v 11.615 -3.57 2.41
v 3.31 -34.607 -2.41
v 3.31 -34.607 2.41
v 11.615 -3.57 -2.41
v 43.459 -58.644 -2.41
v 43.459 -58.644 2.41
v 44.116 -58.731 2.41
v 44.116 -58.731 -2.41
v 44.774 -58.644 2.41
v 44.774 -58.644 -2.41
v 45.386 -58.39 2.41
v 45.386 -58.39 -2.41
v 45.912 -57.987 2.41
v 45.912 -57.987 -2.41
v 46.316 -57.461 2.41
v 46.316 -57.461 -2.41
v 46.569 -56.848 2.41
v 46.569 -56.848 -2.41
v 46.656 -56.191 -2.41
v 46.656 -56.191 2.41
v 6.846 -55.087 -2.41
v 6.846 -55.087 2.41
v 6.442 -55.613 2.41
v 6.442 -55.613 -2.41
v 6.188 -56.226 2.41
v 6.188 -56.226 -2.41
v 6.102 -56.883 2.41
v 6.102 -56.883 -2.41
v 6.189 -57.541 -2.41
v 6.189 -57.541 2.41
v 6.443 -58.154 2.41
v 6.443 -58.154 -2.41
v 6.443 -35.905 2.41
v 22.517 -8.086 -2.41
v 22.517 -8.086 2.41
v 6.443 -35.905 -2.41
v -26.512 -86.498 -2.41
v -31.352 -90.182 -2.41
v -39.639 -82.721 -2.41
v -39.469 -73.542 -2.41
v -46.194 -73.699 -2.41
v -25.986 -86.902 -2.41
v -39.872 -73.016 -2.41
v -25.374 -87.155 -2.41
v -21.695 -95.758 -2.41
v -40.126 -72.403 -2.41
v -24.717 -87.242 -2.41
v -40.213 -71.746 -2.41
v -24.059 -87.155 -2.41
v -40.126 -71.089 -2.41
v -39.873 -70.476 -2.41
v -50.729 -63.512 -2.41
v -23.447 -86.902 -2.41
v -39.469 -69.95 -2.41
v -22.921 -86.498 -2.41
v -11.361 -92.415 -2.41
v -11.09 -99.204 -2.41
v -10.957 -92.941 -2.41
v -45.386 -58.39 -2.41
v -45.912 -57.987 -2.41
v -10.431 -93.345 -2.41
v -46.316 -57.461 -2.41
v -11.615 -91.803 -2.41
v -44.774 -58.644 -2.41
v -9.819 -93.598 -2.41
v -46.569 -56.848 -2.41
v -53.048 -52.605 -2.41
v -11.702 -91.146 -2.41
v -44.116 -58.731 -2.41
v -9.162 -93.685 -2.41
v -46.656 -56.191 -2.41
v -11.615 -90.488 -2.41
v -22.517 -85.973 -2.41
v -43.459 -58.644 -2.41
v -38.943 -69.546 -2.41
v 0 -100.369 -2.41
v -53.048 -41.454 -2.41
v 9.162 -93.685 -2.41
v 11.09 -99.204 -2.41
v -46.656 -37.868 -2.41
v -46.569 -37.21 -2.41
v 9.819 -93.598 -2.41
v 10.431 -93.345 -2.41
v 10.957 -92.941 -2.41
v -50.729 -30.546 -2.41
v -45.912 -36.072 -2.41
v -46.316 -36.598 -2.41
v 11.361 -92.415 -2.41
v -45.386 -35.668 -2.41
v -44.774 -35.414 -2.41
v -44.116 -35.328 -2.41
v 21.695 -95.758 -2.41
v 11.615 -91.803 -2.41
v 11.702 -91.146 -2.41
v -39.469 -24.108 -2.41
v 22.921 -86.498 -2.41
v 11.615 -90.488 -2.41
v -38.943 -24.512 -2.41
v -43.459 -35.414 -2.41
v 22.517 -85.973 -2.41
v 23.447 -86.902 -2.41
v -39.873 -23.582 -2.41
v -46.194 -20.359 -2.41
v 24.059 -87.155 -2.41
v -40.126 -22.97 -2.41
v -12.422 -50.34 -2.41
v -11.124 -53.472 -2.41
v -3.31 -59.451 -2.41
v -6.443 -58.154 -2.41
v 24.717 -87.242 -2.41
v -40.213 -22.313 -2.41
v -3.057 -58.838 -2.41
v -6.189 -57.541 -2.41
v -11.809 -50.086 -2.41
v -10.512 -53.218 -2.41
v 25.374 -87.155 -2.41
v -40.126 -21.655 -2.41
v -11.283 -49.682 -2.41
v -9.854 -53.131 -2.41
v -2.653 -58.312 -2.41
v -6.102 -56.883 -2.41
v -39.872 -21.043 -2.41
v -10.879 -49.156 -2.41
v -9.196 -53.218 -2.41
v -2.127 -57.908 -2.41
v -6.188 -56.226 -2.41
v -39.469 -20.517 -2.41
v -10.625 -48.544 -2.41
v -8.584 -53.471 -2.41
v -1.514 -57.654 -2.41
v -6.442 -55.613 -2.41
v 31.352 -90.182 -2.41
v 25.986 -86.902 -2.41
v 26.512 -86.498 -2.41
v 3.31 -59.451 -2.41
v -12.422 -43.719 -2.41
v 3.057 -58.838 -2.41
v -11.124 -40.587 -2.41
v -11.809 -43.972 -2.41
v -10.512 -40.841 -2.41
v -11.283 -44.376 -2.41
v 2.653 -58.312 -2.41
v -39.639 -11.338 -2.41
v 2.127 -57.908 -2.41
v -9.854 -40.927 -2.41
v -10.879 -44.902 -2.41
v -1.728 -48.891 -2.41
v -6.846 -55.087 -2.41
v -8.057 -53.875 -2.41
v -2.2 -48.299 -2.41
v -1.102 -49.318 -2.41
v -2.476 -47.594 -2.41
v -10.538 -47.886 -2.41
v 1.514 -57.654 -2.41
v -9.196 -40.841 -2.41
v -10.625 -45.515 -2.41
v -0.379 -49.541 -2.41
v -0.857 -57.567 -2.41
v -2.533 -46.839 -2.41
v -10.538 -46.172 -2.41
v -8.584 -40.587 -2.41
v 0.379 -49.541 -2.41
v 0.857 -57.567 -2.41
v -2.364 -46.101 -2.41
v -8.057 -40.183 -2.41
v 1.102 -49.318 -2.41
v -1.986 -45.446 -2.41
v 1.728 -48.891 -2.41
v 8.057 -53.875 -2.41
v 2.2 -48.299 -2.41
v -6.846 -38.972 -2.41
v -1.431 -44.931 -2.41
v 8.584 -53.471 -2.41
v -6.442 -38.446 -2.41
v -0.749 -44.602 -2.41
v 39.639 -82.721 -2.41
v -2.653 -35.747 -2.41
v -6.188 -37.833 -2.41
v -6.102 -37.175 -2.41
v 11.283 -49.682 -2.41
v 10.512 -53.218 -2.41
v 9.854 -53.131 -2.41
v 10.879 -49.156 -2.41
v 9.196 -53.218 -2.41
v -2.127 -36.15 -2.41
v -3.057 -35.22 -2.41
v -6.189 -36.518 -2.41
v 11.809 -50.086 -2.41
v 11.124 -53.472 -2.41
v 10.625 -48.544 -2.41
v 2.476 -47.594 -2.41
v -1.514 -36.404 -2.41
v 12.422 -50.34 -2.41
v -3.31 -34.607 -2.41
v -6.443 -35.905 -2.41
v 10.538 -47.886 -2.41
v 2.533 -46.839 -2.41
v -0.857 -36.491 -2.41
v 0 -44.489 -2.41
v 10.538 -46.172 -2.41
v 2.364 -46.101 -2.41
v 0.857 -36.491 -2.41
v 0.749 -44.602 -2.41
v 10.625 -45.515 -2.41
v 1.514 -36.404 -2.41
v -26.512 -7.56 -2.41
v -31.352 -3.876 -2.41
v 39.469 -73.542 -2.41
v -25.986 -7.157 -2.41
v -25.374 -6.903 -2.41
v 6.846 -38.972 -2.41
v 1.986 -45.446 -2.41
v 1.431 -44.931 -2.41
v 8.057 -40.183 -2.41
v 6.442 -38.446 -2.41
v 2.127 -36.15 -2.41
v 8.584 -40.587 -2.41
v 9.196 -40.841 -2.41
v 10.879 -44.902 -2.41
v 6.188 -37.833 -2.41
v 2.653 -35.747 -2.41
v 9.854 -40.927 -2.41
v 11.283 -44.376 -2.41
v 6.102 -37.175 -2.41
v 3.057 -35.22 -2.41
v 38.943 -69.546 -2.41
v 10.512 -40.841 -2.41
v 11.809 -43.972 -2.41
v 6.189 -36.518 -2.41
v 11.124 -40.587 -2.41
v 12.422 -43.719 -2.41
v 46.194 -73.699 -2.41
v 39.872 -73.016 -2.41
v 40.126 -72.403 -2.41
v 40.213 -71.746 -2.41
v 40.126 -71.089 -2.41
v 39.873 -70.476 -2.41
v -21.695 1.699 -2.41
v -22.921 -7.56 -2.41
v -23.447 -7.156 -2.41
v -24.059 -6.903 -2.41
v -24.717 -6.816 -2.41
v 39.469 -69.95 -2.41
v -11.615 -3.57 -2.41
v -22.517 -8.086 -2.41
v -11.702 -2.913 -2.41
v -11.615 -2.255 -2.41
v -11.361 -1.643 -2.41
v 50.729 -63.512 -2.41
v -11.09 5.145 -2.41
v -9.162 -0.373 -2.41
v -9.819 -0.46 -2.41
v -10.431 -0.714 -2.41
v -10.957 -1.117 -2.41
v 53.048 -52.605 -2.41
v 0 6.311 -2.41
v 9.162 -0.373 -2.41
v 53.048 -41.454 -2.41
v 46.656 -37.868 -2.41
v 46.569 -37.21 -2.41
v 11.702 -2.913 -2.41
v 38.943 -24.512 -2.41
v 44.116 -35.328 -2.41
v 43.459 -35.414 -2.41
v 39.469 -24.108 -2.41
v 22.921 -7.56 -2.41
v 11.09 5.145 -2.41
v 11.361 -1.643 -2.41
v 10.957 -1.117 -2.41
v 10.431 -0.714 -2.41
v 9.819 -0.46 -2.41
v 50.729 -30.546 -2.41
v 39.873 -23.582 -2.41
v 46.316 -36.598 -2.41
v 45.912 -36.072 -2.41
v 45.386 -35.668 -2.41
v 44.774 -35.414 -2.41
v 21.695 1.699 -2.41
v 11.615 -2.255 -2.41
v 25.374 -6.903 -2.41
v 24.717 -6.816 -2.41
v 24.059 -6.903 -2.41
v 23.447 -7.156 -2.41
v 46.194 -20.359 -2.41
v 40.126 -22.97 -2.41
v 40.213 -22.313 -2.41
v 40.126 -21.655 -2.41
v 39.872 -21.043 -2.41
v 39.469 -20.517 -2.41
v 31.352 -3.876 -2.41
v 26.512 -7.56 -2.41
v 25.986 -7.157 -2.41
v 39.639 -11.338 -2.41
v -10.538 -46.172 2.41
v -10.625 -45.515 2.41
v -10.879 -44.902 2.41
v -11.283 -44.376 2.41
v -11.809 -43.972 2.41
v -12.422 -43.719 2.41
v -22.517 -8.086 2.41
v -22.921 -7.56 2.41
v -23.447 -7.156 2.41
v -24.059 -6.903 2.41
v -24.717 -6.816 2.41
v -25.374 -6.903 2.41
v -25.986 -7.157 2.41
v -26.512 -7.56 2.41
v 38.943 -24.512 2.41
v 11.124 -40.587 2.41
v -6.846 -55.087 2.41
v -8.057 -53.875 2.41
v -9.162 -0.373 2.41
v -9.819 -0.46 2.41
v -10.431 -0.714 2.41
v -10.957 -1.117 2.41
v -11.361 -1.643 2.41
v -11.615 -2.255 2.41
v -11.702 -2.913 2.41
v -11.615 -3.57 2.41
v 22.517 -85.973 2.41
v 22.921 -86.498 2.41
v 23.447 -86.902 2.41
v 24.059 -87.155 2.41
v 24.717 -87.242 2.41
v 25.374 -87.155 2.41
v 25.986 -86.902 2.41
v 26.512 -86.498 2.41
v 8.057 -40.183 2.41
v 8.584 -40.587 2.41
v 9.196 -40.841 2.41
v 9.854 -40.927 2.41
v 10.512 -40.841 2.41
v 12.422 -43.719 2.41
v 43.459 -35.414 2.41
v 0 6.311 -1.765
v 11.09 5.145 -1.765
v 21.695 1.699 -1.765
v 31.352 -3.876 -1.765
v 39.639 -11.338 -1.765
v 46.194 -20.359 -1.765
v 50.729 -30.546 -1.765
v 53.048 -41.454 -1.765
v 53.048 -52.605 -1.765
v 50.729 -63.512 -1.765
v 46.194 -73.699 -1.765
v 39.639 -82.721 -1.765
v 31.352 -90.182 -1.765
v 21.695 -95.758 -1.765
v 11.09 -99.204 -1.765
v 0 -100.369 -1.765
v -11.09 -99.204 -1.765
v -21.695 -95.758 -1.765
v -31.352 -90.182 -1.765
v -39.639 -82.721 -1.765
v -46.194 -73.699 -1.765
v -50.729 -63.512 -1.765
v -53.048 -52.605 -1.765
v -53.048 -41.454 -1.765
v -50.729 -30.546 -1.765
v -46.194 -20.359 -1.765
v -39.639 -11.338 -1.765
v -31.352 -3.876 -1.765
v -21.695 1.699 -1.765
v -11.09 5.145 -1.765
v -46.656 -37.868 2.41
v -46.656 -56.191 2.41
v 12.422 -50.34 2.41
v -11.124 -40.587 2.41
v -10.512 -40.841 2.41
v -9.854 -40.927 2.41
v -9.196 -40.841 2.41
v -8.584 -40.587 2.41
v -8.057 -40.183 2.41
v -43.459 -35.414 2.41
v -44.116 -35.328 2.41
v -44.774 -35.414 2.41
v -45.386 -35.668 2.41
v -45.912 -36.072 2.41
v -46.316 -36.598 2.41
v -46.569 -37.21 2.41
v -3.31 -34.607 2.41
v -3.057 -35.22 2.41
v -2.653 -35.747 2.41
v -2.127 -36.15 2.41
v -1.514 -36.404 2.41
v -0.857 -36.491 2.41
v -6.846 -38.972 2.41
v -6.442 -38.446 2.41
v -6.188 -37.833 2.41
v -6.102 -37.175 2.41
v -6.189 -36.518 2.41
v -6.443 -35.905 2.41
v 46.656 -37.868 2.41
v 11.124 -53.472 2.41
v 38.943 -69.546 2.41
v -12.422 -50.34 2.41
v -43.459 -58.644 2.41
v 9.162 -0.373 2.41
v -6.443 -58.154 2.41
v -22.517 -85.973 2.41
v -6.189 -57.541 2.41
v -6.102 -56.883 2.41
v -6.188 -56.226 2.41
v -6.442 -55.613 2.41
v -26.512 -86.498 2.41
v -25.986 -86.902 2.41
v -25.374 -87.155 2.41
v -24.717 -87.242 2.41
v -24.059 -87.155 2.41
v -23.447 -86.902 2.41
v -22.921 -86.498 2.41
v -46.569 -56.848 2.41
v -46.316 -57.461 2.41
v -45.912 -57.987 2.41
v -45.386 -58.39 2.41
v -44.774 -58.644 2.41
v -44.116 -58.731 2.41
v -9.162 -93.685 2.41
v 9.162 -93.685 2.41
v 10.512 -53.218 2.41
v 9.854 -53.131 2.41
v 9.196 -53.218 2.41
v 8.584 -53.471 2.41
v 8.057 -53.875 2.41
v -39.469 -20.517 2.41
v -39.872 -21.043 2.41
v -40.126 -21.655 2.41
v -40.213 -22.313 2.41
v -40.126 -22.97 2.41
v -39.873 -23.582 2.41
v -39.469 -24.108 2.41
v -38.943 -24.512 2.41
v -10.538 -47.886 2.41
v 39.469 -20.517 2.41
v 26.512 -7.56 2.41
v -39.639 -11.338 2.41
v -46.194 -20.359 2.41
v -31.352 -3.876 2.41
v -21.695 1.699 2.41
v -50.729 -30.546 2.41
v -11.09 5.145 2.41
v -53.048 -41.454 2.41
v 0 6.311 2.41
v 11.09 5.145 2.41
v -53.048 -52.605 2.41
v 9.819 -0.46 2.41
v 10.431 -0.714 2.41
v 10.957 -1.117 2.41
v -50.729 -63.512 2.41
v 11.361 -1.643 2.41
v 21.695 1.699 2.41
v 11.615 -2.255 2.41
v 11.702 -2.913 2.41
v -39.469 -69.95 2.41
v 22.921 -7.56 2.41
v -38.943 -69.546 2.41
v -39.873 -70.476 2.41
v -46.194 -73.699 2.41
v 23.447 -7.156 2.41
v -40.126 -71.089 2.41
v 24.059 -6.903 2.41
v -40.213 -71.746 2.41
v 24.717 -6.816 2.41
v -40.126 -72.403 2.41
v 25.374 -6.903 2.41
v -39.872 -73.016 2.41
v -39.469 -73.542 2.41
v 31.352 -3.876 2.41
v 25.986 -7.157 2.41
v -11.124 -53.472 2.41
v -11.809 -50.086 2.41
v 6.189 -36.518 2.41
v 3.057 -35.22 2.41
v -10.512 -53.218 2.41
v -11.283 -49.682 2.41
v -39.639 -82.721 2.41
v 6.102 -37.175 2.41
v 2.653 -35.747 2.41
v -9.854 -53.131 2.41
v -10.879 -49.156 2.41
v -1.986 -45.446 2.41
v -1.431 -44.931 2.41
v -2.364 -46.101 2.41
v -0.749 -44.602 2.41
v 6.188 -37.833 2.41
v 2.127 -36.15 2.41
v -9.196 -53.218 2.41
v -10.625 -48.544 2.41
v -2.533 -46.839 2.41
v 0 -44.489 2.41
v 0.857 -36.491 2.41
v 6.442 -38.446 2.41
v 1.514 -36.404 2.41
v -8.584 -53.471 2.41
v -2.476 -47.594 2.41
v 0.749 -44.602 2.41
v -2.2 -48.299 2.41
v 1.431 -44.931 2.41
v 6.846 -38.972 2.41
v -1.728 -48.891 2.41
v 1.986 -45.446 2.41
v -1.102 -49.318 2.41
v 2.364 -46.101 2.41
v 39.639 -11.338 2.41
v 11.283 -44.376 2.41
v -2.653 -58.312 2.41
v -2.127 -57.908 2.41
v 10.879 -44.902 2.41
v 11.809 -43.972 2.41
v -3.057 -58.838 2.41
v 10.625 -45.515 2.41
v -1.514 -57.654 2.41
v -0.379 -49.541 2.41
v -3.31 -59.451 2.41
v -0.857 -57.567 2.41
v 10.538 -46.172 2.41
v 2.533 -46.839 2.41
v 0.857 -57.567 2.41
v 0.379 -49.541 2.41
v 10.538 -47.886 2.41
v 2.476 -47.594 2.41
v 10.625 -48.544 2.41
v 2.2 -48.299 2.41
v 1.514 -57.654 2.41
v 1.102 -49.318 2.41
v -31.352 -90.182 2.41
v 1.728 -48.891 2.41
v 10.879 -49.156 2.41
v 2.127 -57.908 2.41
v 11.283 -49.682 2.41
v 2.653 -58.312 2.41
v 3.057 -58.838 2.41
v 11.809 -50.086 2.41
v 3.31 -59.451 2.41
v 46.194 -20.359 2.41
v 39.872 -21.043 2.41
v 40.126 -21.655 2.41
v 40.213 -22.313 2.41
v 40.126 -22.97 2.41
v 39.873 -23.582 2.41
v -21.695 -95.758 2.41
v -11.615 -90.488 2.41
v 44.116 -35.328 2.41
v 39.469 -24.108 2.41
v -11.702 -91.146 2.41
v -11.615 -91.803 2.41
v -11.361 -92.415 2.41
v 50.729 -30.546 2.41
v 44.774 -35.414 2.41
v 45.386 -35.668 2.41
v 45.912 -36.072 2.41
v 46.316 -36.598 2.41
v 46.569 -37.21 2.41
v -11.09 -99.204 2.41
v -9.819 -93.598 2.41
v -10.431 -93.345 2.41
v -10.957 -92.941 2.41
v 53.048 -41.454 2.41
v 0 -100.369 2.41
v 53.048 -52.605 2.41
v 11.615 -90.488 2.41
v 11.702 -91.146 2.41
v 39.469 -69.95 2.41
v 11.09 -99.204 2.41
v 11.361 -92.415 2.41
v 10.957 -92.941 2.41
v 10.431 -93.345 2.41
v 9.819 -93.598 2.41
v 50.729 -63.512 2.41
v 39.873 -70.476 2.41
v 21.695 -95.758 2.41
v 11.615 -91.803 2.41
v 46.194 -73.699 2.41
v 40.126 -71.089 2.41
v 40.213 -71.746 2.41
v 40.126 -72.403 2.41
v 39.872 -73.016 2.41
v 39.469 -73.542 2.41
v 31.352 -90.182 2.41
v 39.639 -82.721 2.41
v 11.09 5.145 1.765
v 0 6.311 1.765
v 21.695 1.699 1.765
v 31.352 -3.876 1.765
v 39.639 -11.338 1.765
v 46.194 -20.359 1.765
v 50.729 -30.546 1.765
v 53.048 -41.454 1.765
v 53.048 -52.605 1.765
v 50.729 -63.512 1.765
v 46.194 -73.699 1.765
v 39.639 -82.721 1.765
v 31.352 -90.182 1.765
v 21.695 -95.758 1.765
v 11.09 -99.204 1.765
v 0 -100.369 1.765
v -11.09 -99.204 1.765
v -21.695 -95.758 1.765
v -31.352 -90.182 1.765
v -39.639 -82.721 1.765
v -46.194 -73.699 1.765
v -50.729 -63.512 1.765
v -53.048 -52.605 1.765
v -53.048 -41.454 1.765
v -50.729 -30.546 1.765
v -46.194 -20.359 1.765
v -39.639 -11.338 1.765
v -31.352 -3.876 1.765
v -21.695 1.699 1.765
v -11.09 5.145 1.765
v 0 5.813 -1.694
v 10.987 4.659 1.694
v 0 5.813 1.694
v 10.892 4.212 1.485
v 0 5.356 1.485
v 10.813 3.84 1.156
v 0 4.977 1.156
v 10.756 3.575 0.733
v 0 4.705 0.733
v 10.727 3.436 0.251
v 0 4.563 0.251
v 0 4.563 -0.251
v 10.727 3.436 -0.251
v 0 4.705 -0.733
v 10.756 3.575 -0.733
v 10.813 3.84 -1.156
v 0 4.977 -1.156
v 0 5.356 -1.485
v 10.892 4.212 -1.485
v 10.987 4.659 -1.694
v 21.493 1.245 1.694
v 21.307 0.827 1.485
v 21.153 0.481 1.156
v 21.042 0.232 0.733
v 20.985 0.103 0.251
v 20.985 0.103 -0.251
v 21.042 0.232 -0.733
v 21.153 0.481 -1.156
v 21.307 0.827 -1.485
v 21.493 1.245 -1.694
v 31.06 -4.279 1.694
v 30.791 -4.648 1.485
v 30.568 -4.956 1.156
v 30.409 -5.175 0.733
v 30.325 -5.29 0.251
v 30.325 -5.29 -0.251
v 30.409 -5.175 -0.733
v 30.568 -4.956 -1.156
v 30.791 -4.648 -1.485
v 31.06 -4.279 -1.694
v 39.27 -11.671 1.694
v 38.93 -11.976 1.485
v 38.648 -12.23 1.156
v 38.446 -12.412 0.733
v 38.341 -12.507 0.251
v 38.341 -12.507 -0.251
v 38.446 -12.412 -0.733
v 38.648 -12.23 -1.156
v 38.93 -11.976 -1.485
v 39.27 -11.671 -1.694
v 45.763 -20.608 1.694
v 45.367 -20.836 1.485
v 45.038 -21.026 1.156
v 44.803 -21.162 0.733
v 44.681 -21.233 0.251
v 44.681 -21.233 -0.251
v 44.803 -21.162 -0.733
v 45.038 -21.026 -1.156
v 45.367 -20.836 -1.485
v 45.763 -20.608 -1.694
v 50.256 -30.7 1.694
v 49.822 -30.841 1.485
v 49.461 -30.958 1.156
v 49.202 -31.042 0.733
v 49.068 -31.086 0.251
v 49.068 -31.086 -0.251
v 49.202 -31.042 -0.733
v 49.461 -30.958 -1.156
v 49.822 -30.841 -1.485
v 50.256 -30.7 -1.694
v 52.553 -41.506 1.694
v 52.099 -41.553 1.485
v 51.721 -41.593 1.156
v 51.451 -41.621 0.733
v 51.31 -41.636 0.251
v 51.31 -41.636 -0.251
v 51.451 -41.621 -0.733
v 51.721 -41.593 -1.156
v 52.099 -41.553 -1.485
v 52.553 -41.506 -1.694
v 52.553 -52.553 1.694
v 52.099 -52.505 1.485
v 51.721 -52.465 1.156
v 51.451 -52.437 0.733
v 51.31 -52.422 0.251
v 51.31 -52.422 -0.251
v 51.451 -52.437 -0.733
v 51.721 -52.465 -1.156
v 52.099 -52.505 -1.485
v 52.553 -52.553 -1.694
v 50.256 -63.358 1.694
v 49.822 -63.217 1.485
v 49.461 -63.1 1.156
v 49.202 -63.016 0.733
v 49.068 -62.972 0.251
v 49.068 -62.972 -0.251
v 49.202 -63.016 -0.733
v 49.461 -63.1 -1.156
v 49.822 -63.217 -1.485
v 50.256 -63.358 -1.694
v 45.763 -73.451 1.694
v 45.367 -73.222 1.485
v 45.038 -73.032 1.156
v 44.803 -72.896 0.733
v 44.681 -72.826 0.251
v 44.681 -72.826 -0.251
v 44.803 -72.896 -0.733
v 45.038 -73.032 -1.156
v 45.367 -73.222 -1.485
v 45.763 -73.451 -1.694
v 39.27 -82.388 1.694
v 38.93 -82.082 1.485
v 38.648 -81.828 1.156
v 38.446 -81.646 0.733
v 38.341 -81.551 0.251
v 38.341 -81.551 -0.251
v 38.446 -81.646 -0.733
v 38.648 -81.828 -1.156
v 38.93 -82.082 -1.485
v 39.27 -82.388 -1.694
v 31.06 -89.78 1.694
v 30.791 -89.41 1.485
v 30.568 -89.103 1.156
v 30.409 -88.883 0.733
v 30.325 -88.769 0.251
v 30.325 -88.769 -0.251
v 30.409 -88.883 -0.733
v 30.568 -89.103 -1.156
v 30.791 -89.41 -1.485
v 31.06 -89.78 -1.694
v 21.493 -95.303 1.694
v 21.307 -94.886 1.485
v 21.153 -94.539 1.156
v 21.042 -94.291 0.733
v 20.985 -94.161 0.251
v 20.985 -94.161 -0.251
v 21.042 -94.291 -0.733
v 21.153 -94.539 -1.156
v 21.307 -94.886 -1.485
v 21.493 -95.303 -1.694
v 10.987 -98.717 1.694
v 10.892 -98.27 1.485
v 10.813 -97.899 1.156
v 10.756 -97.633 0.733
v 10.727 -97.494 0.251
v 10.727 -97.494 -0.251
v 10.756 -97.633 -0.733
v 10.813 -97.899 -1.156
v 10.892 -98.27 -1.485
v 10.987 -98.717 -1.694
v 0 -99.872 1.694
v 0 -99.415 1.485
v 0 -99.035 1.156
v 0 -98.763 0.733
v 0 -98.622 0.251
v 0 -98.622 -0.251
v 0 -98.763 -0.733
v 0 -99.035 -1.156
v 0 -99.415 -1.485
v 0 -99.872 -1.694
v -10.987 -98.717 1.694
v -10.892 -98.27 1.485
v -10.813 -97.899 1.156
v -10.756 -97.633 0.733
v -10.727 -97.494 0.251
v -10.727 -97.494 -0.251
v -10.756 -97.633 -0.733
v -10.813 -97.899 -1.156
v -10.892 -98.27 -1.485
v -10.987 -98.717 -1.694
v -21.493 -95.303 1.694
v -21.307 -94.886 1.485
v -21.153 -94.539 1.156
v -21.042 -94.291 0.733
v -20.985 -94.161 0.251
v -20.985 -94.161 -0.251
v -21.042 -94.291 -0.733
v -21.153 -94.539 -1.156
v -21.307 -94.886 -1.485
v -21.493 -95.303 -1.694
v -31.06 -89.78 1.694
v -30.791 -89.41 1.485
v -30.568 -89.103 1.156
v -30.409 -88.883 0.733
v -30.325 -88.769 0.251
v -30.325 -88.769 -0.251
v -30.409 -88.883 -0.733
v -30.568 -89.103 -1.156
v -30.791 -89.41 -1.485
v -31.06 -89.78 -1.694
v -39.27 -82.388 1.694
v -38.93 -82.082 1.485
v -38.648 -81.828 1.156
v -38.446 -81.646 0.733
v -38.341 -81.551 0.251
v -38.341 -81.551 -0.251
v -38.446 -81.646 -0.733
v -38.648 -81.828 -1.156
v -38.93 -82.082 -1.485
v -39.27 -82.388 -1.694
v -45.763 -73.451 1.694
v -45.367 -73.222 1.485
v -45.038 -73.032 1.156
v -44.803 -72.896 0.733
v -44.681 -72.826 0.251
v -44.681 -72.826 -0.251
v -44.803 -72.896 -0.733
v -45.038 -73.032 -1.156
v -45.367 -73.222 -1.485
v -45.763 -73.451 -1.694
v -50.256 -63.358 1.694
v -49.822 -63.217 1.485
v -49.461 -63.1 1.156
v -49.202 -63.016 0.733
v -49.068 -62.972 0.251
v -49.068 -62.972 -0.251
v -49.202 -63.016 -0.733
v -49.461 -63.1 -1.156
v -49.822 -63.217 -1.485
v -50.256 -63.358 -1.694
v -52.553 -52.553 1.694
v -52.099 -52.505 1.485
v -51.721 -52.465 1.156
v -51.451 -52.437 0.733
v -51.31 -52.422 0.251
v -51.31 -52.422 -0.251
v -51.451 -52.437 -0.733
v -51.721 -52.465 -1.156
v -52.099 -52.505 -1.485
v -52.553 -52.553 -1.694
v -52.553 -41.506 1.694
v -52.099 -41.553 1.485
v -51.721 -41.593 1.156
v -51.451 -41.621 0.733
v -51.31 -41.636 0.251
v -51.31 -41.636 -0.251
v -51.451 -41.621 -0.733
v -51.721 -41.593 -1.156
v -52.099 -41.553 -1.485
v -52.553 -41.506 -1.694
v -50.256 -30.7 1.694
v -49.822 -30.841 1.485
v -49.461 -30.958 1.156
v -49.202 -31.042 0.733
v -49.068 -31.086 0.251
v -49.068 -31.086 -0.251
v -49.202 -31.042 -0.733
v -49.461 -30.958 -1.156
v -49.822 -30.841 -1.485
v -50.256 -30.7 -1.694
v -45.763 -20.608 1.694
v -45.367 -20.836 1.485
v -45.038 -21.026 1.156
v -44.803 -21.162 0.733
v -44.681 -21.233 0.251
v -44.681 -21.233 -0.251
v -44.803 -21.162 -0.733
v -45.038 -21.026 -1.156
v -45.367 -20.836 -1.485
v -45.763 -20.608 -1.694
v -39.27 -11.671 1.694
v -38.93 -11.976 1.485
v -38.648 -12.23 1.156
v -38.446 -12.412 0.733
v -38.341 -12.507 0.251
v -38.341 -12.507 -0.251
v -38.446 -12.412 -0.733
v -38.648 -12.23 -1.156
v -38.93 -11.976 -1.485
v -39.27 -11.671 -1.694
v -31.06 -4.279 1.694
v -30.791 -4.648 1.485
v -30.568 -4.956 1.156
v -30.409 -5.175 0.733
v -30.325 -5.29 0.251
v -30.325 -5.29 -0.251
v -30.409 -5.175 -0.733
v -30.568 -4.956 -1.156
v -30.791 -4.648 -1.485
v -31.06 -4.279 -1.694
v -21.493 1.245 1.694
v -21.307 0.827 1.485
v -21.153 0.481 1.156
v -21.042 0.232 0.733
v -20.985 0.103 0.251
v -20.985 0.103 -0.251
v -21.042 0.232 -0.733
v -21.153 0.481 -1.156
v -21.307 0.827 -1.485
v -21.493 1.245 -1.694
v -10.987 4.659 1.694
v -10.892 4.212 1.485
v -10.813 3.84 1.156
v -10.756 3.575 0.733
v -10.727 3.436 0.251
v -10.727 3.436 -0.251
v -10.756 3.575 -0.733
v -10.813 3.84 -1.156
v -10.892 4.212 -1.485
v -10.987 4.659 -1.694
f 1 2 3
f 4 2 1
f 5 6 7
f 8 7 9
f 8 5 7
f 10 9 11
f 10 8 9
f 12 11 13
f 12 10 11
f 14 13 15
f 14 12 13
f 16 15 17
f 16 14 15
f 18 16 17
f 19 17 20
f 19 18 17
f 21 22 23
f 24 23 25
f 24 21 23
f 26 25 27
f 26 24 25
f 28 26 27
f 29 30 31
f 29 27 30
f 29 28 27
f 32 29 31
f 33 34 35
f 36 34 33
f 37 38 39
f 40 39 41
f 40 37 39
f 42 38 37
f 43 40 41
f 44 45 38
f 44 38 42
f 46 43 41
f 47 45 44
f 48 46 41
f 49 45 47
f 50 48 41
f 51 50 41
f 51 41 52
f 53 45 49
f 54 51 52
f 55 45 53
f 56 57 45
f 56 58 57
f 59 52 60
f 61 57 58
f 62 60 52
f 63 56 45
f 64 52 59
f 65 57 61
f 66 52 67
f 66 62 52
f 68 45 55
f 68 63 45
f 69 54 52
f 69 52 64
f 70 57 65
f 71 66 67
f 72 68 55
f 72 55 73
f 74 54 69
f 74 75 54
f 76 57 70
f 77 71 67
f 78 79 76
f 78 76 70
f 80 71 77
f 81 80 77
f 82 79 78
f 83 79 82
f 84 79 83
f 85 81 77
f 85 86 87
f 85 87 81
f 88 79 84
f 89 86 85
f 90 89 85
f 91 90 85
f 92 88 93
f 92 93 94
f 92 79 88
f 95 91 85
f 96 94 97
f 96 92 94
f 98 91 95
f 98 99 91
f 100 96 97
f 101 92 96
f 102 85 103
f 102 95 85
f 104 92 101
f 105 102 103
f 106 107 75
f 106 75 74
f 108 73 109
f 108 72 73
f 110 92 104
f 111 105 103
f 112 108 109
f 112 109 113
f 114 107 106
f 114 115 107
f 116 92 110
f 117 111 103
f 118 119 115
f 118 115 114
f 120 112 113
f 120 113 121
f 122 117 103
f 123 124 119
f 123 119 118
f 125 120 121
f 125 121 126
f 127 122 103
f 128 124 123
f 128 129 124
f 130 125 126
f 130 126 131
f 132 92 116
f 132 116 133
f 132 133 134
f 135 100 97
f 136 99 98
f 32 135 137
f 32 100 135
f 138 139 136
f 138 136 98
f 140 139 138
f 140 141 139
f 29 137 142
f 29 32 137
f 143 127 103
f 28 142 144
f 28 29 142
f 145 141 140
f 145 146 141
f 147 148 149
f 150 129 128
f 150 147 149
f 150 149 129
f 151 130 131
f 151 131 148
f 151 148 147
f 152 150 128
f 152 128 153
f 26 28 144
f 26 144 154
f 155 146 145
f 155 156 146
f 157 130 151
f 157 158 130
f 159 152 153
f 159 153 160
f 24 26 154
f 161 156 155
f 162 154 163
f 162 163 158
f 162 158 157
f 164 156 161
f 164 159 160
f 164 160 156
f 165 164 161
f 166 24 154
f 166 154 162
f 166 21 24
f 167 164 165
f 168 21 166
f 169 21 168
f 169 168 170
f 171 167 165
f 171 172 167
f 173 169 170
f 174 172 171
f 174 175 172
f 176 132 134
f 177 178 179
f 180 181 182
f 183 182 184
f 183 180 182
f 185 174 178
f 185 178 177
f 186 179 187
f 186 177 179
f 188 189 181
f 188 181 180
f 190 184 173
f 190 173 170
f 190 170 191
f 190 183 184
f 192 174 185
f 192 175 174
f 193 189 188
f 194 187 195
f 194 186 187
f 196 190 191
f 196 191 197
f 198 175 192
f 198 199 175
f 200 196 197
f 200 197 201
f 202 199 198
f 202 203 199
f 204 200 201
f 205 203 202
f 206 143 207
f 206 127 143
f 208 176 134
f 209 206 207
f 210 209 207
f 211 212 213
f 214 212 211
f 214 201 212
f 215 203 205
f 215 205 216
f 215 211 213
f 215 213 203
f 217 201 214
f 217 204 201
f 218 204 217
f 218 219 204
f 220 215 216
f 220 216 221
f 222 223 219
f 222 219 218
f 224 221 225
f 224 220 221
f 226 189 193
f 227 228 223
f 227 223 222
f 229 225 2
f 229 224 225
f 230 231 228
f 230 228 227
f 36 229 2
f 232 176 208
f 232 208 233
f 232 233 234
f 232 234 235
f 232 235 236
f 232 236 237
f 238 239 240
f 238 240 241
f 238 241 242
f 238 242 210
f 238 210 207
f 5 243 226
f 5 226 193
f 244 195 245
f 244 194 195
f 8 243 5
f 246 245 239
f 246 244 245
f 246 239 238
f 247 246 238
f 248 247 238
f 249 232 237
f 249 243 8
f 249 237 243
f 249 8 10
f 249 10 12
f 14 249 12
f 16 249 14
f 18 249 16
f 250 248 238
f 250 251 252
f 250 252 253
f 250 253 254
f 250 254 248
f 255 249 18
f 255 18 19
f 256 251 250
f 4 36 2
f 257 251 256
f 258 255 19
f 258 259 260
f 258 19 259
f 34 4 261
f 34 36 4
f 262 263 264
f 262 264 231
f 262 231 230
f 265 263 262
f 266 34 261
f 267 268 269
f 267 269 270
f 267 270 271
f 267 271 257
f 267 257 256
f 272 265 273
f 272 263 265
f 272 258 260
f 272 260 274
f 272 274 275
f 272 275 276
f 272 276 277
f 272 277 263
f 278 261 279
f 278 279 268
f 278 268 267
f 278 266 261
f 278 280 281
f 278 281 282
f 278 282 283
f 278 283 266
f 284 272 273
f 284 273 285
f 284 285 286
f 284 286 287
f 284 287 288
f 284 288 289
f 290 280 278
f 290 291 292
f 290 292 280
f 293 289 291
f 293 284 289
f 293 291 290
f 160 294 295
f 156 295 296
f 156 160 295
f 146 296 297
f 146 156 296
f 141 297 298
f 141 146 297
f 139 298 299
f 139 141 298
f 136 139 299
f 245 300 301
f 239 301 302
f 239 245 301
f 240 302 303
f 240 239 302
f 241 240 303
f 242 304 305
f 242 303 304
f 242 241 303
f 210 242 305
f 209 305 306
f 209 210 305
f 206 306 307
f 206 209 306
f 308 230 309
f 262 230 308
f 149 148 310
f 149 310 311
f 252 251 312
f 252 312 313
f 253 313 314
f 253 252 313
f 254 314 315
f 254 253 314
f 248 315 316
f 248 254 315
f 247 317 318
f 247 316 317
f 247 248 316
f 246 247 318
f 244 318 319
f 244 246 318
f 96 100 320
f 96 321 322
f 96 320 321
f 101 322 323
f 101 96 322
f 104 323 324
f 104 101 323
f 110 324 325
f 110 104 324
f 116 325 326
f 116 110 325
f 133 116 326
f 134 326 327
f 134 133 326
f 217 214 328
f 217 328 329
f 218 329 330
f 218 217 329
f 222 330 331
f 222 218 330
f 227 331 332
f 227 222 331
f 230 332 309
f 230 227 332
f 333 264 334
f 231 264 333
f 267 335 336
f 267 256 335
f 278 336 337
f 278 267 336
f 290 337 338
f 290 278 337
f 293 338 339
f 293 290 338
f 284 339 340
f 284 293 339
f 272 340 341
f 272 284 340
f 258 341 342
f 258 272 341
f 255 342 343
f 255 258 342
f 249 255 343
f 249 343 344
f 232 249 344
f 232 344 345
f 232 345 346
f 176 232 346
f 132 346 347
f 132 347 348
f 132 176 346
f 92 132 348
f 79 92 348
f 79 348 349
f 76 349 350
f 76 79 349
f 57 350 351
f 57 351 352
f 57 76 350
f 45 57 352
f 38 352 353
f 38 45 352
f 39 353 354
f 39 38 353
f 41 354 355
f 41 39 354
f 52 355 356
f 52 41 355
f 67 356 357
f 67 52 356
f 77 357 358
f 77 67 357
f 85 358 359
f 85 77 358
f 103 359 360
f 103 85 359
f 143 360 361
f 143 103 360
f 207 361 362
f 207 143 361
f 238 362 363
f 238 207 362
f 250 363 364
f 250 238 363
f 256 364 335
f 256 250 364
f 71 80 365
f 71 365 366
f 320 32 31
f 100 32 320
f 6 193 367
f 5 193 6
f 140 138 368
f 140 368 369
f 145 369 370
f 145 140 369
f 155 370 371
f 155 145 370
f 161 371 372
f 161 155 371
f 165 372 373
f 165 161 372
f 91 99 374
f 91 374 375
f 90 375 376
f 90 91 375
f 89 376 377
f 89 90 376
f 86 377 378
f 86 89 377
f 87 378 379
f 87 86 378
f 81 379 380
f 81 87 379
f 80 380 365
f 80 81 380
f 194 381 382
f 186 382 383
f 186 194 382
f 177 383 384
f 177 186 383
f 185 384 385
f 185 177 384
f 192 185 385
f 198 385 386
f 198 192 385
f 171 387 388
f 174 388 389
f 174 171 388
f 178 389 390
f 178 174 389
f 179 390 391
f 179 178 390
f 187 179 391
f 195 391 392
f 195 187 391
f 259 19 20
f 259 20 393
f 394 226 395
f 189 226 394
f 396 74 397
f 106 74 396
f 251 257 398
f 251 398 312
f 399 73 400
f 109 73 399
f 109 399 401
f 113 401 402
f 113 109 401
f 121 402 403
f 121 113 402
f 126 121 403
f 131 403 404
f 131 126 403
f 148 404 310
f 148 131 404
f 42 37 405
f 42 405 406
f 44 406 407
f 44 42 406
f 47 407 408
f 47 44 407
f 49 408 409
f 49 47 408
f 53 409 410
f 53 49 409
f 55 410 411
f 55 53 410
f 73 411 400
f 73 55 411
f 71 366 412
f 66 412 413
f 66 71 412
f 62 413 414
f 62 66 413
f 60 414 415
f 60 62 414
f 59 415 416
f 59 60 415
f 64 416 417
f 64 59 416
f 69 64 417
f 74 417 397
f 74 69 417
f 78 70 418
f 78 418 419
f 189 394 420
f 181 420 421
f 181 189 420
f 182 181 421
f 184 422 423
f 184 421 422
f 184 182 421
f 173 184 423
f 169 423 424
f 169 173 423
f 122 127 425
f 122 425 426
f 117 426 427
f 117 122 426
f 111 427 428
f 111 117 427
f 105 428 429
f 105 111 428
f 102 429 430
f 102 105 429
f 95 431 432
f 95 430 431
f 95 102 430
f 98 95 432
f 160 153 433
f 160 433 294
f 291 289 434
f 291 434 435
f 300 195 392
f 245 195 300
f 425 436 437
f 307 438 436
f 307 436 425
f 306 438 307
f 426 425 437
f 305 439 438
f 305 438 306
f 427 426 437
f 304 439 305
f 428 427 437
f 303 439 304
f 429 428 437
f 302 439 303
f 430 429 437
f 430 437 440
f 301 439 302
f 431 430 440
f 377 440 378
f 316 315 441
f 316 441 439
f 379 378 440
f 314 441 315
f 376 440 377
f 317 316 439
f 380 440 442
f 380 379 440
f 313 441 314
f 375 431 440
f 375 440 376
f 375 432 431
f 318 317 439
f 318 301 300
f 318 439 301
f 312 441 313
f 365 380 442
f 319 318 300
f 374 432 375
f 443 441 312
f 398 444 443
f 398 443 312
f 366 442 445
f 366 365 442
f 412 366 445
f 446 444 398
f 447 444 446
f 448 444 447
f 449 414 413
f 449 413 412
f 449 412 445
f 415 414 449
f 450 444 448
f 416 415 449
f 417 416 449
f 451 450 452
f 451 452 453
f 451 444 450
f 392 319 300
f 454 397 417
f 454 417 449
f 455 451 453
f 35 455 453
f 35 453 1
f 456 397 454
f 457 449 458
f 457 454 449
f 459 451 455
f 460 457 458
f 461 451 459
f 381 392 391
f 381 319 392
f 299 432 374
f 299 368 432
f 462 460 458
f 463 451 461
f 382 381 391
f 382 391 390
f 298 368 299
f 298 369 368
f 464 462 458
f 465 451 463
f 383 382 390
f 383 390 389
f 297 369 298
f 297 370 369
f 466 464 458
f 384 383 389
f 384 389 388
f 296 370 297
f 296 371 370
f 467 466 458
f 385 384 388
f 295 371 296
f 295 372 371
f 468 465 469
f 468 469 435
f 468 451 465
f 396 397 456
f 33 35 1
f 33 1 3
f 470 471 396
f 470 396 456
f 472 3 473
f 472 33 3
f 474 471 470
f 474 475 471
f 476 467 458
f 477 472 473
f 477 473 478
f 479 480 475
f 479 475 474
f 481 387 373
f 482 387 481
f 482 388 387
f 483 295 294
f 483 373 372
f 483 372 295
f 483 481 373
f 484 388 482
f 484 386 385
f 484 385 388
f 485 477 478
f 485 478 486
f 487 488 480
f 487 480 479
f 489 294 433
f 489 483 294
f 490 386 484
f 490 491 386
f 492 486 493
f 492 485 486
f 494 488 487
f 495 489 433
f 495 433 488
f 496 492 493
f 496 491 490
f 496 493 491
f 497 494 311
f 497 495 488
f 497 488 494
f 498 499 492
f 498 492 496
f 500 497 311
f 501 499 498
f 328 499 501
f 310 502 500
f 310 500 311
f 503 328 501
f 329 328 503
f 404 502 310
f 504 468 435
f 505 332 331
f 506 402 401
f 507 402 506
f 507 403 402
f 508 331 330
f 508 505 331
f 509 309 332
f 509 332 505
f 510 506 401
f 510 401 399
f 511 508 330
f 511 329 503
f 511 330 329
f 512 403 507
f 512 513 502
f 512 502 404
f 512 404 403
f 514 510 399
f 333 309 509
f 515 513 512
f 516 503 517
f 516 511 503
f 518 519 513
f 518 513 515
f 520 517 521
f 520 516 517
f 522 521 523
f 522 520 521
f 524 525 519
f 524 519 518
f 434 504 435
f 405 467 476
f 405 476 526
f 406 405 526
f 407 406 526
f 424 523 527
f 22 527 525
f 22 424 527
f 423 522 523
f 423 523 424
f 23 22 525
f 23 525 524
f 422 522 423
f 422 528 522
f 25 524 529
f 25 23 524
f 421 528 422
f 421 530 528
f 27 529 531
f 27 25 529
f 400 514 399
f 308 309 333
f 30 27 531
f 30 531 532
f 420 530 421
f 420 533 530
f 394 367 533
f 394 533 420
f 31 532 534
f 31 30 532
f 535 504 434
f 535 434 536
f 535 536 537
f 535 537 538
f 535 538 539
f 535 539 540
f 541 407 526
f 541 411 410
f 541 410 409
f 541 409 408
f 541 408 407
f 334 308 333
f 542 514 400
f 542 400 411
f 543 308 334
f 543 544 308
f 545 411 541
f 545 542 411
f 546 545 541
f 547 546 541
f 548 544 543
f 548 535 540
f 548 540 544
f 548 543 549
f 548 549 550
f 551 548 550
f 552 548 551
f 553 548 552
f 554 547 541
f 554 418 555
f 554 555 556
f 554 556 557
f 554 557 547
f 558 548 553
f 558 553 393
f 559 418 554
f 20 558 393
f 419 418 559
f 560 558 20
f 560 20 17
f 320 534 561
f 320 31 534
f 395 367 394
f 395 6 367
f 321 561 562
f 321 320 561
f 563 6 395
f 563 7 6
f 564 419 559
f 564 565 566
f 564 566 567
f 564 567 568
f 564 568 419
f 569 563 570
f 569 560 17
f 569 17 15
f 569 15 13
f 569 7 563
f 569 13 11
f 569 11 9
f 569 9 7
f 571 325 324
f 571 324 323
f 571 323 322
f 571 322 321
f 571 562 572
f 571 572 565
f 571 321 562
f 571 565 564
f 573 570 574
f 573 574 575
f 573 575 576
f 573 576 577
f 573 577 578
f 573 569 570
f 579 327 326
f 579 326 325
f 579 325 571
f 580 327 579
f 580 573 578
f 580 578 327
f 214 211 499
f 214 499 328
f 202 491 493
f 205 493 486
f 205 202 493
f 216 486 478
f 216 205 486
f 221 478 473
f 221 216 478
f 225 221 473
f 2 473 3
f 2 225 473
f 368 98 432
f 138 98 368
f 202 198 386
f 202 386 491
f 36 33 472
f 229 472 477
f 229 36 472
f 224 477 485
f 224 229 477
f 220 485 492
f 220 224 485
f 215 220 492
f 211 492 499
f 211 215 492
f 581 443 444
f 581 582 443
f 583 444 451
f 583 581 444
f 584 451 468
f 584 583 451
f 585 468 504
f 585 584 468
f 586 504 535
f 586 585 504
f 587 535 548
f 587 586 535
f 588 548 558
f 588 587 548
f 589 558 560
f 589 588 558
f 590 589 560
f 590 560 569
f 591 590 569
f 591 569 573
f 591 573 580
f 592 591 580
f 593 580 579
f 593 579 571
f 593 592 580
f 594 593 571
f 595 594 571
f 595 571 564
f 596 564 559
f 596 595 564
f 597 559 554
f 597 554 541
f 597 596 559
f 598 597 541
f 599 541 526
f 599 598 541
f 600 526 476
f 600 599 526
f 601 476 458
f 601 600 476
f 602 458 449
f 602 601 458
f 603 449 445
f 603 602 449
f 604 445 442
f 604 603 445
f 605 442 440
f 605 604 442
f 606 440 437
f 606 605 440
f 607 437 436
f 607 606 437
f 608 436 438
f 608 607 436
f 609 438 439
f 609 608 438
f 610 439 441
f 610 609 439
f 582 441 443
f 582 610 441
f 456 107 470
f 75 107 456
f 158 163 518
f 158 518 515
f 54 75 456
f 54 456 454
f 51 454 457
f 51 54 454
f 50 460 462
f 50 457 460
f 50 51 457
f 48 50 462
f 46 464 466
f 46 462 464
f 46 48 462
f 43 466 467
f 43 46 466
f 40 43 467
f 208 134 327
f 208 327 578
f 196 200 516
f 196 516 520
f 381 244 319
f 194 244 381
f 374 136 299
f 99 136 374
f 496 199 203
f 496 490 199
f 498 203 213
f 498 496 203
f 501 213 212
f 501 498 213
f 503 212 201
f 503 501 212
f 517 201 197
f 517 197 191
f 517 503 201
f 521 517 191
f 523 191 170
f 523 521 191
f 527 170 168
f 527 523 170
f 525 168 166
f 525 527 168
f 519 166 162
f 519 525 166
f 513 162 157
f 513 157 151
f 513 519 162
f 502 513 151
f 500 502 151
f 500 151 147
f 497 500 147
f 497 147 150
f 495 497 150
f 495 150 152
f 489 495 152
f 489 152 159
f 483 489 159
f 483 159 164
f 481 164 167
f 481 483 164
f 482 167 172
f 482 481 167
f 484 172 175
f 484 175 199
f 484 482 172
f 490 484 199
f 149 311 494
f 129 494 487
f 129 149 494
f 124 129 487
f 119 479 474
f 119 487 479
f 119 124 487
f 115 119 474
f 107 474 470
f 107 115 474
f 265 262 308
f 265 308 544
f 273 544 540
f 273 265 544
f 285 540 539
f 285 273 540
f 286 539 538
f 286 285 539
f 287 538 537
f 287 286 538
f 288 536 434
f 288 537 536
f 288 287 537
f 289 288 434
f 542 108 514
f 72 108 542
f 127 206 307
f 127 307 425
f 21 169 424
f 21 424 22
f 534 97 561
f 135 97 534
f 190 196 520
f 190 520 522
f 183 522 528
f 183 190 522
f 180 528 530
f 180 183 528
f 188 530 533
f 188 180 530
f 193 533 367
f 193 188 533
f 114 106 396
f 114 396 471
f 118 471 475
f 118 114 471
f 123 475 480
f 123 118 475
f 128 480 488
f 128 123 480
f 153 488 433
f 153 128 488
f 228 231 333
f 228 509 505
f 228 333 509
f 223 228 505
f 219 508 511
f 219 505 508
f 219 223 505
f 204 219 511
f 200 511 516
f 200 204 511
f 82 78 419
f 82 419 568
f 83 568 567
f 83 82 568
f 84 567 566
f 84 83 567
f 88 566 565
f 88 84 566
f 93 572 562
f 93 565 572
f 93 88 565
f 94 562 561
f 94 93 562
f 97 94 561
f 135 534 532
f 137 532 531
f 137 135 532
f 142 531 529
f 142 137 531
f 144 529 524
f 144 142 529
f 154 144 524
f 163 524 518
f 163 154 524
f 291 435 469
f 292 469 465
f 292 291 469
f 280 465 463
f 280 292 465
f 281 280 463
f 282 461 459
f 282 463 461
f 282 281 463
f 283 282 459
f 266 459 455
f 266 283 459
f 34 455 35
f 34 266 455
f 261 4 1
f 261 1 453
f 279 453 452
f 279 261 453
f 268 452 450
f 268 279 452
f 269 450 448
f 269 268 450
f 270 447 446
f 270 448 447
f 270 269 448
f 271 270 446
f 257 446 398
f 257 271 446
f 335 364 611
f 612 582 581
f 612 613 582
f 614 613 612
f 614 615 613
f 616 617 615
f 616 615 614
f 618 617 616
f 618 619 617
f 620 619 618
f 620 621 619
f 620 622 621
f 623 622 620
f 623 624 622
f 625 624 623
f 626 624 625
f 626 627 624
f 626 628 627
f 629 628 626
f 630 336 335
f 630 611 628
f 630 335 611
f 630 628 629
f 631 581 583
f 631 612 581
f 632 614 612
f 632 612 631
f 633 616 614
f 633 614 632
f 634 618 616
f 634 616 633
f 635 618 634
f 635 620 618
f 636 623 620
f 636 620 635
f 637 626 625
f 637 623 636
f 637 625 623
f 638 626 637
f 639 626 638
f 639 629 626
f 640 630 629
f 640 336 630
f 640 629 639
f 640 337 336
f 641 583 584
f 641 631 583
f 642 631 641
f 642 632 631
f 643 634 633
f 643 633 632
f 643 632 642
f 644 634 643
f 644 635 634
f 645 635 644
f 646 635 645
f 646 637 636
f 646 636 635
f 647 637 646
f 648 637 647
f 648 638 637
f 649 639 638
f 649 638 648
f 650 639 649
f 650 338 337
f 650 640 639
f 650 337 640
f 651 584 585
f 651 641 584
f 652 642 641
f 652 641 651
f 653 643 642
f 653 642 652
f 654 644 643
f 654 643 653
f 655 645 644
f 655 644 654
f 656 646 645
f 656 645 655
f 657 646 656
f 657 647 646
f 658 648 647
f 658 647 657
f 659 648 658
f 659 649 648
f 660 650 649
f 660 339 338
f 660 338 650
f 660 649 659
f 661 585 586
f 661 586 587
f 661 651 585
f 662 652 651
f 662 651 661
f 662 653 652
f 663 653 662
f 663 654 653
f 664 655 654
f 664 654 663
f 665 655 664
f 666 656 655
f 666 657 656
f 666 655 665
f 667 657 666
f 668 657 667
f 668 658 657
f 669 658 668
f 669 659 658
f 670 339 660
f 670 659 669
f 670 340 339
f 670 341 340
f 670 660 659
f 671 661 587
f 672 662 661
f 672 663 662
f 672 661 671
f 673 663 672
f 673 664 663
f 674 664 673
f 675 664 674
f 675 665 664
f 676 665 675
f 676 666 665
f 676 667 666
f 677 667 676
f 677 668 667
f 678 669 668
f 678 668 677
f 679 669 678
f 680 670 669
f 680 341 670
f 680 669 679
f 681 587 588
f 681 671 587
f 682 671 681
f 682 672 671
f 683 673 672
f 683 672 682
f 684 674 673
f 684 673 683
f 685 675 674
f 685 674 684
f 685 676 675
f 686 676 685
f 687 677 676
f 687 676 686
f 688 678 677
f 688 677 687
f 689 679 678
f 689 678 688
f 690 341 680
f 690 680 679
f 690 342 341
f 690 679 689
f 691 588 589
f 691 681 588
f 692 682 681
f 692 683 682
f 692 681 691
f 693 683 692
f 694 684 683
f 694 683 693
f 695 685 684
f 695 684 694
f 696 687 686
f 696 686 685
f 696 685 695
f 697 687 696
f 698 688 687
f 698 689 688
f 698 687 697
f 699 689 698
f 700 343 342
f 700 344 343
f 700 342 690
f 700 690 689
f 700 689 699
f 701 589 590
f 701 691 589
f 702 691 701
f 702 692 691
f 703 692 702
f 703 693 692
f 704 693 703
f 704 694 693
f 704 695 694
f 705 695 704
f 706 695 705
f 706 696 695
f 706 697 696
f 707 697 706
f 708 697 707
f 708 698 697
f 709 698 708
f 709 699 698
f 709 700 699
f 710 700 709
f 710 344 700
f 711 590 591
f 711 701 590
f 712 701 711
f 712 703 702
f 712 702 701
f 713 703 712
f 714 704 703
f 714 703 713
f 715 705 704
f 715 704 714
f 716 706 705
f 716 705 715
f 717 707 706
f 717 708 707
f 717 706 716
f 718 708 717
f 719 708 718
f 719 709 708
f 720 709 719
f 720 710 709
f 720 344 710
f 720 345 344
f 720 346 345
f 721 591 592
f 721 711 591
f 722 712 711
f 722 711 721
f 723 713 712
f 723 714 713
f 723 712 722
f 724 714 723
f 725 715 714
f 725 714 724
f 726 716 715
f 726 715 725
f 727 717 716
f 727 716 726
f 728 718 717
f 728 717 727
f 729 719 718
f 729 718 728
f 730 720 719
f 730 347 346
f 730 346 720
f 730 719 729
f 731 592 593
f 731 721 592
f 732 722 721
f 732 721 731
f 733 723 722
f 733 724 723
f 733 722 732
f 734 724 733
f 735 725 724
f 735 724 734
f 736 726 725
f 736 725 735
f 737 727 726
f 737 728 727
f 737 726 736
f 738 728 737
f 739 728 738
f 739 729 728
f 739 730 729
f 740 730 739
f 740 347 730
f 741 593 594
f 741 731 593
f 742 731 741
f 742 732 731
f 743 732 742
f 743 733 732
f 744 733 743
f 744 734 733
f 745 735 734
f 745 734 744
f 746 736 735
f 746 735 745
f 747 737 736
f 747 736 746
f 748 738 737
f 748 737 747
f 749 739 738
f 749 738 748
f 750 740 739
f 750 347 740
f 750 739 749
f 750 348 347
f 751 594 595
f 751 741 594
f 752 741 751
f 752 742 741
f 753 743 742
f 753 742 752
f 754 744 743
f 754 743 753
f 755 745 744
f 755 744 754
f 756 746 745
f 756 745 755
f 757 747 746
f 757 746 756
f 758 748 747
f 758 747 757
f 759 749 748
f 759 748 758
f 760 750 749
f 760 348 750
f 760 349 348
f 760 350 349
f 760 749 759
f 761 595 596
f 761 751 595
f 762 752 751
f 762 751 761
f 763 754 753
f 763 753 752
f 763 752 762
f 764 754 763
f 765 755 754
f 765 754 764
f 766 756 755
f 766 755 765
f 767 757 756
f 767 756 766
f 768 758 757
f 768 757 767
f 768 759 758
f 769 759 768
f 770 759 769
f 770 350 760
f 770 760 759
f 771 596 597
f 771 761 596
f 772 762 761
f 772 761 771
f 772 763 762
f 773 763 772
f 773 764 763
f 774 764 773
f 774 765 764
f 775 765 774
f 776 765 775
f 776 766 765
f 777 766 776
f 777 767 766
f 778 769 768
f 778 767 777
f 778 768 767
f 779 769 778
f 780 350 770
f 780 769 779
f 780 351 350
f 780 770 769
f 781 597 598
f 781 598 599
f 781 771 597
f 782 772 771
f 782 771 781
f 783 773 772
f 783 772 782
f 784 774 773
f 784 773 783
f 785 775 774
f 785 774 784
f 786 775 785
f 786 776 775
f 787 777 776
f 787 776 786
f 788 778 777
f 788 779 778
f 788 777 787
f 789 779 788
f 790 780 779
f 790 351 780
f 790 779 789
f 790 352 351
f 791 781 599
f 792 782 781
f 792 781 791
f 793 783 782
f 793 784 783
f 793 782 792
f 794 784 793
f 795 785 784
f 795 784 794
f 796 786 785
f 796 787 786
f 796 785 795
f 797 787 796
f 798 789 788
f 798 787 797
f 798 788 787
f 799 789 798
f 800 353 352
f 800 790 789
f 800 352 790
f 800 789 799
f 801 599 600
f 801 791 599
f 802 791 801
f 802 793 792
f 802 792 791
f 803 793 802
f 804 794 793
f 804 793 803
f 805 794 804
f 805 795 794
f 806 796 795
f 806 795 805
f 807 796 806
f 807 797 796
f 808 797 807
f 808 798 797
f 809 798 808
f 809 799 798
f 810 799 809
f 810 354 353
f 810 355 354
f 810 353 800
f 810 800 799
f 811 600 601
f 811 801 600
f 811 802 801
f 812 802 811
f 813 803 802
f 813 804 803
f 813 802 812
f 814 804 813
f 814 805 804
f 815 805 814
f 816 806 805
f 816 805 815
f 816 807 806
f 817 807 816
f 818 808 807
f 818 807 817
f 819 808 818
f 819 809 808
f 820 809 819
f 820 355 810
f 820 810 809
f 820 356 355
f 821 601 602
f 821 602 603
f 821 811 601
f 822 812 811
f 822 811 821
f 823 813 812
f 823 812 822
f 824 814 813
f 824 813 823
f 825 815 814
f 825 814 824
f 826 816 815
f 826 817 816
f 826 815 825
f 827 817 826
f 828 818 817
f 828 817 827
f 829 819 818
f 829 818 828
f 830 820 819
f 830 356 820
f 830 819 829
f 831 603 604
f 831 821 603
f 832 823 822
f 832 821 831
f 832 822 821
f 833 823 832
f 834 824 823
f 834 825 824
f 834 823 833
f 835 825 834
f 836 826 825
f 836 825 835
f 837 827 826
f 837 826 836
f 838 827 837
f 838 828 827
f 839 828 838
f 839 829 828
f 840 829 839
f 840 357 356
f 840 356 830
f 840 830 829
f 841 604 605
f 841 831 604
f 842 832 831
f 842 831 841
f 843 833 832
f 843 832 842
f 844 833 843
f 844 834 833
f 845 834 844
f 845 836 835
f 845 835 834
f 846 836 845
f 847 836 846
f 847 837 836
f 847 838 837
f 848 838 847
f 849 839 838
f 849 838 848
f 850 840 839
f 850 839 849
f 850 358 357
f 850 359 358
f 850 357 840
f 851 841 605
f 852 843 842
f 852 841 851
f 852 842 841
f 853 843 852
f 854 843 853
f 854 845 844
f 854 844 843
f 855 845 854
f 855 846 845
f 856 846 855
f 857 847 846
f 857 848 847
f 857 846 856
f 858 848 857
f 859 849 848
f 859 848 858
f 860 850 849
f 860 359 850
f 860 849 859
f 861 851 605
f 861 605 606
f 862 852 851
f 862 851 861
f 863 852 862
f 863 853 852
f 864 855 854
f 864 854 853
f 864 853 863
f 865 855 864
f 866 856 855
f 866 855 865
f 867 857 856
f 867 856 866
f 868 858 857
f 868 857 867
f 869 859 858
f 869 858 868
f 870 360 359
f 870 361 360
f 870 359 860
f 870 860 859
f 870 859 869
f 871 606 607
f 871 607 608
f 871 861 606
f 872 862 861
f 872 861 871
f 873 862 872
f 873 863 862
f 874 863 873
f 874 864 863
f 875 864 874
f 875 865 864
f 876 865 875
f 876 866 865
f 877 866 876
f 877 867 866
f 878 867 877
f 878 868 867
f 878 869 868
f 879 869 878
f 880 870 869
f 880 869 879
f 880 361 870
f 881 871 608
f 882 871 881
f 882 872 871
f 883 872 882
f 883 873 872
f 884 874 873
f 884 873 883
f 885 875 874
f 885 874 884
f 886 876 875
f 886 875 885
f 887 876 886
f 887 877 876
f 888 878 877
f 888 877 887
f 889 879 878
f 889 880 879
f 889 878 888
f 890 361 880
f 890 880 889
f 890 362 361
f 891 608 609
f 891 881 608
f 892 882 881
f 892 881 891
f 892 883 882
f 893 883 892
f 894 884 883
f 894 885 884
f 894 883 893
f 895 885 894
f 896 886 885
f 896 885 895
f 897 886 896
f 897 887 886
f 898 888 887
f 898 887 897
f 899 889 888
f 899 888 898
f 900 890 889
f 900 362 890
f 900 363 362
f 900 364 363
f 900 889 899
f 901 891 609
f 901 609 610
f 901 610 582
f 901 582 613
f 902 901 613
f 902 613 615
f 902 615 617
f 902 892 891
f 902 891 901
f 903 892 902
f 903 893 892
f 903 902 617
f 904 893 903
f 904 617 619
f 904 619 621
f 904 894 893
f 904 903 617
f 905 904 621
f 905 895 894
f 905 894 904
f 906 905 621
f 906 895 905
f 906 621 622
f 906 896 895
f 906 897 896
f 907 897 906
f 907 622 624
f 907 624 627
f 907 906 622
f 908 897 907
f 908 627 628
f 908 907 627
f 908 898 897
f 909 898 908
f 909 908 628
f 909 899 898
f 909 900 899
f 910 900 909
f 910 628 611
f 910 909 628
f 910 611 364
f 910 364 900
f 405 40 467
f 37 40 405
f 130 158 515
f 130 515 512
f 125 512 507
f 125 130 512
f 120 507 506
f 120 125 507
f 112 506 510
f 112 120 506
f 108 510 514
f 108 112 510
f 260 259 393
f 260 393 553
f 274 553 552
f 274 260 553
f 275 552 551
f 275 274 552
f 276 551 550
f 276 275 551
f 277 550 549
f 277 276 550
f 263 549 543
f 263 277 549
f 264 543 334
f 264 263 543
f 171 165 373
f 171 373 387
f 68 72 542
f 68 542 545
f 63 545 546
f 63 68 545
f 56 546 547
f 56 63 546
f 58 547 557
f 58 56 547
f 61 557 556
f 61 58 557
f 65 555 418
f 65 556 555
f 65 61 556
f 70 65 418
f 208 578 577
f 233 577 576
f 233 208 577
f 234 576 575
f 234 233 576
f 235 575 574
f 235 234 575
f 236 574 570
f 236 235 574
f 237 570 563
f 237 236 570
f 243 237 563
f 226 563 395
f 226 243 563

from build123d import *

# Parameters (mm, degrees)
CUT_EXTRUDE1_DEPTH = 7.62


with BuildPart() as part:
    # Sketch1 → Revolve1 (revolve)
    with BuildSketch(Plane(origin=(0, 0, 0), x_dir=(0, 0, -1), z_dir=(1, 0, 0))):
        with BuildLine():
            Line((-2.409610907, -44.48919659), (-2.409610907, 6.31080341))
            Line((-2.409610907, 6.31080341), (-1.7653, 6.31080341))
            ThreePointArc((-1.7653, 6.31080341), (0, 4.54550341), (1.7653, 6.31080341))
            Line((1.7653, 6.31080341), (2.409610907, 6.31080341))
            Line((2.409610907, 6.31080341), (2.409610907, -44.48919659))
            Line((2.409610907, -44.48919659), (-2.409610907, -44.48919659))
        make_face()
    revolve(axis=Axis((0, -47.02919659, 19.251181834), (0, 0, -1)))

    # Sketch2 → Cut-Extrude1 (cut)
    with BuildSketch(Plane(origin=(0, 0, -2.409610907), x_dir=(-1, 0, 0), z_dir=(0, 0, -1))):
        with BuildLine():
            Line((-9.161557863, -0.373493478), (9.161557863, -0.373493478))
            ThreePointArc((9.161557863, -0.373493478), (11.176404431, -1.366886448), (11.615239648, -3.570034182))
            Line((11.615239648, -3.570034182), (3.310434261, -34.607484824))
            ThreePointArc((3.310434261, -34.607484824), (2.403359506, -35.965790688), (0.856752476, -36.490944119))
            Line((0.856752476, -36.490944119), (-0.856752476, -36.490944119))
            ThreePointArc((-0.856752476, -36.490944119), (-2.403359506, -35.965790688), (-3.310434261, -34.607484824))
            Line((-3.310434261, -34.607484824), (-11.615239648, -3.570034182))
            ThreePointArc((-11.615239648, -3.570034182), (-11.176404431, -1.366886448), (-9.161557863, -0.373493478))
        make_face()
        with BuildLine():
            Line((38.943483164, -24.512142867), (11.124307138, -40.586550481))
            ThreePointArc((11.124307138, -40.586550481), (9.52244114, -40.905619058), (8.057485269, -40.183342291))
            Line((8.057485269, -40.183342291), (6.845854298, -38.971711321))
            ThreePointArc((6.845854298, -38.971711321), (6.123577532, -37.506755449), (6.442646109, -35.904889451))
            Line((6.442646109, -35.904889451), (22.517053723, -8.085713426))
            ThreePointArc((22.517053723, -8.085713426), (24.385217783, -6.838156081), (26.512364361, -7.560432847))
            Line((26.512364361, -7.560432847), (39.468763743, -20.516832229))
            ThreePointArc((39.468763743, -20.516832229), (40.191040509, -22.643978806), (38.943483164, -24.512142867))
        make_face()
        with BuildLine():
            Line((43.459162408, -58.644436238), (12.421711766, -50.339630851))
            ThreePointArc((12.421711766, -50.339630851), (11.063405902, -49.432556096), (10.53825247, -47.885949066))
            Line((10.53825247, -47.885949066), (10.53825247, -46.172444114))
            ThreePointArc((10.53825247, -46.172444114), (11.063405902, -44.625837084), (12.421711766, -43.718762329))
            Line((12.421711766, -43.718762329), (43.459162408, -35.413956942))
            ThreePointArc((43.459162408, -35.413956942), (45.662310142, -35.852792158), (46.655703112, -37.867638727))
            Line((46.655703112, -37.867638727), (46.655703112, -56.190754453))
            ThreePointArc((46.655703112, -56.190754453), (45.662310142, -58.205601021), (43.459162408, -58.644436238))
        make_face()
        with BuildLine():
            Line((22.517053723, -85.972679753), (6.442646109, -58.153503728))
            ThreePointArc((6.442646109, -58.153503728), (6.123577532, -56.55163773), (6.845854298, -55.086681859))
            Line((6.845854298, -55.086681859), (8.057485269, -53.875050888))
            ThreePointArc((8.057485269, -53.875050888), (9.52244114, -53.152774122), (11.124307138, -53.471842699))
            Line((11.124307138, -53.471842699), (38.943483164, -69.546250313))
            ThreePointArc((38.943483164, -69.546250313), (40.191040509, -71.414414373), (39.468763743, -73.54156095))
            Line((39.468763743, -73.54156095), (26.512364361, -86.497960333))
            ThreePointArc((26.512364361, -86.497960333), (24.385217783, -87.220237099), (22.517053723, -85.972679753))
        make_face()
        with BuildLine():
            Line((-11.615239648, -90.488358998), (-3.310434261, -59.450908356))
            ThreePointArc((-3.310434261, -59.450908356), (-2.403359506, -58.092602492), (-0.856752476, -57.56744906))
            Line((-0.856752476, -57.56744906), (0.856752476, -57.56744906))
            ThreePointArc((0.856752476, -57.56744906), (2.403359506, -58.092602492), (3.310434261, -59.450908356))
            Line((3.310434261, -59.450908356), (11.615239648, -90.488358998))
            ThreePointArc((11.615239648, -90.488358998), (11.176404431, -92.691506732), (9.161557863, -93.684899702))
            Line((9.161557863, -93.684899702), (-9.161557863, -93.684899702))
            ThreePointArc((-9.161557863, -93.684899702), (-11.176404431, -92.691506732), (-11.615239648, -90.488358998))
        make_face()
        with BuildLine():
            Line((-38.943483164, -69.546250313), (-11.124307138, -53.471842699))
            ThreePointArc((-11.124307138, -53.471842699), (-9.52244114, -53.152774122), (-8.057485269, -53.875050888))
            Line((-8.057485269, -53.875050888), (-6.845854298, -55.086681859))
            ThreePointArc((-6.845854298, -55.086681859), (-6.123577532, -56.55163773), (-6.442646109, -58.153503728))
            Line((-6.442646109, -58.153503728), (-22.517053723, -85.972679753))
            ThreePointArc((-22.517053723, -85.972679753), (-24.385217783, -87.220237099), (-26.512364361, -86.497960333))
            Line((-26.512364361, -86.497960333), (-39.468763743, -73.54156095))
            ThreePointArc((-39.468763743, -73.54156095), (-40.191040509, -71.414414373), (-38.943483164, -69.546250313))
        make_face()
        with BuildLine():
            Line((-43.459162408, -35.413956942), (-12.421711766, -43.718762329))
            ThreePointArc((-12.421711766, -43.718762329), (-11.063405902, -44.625837084), (-10.53825247, -46.172444114))
            Line((-10.53825247, -46.172444114), (-10.53825247, -47.885949066))
            ThreePointArc((-10.53825247, -47.885949066), (-11.063405902, -49.432556096), (-12.421711766, -50.339630851))
            Line((-12.421711766, -50.339630851), (-43.459162408, -58.644436238))
            ThreePointArc((-43.459162408, -58.644436238), (-45.662310142, -58.205601021), (-46.655703112, -56.190754453))
            Line((-46.655703112, -56.190754453), (-46.655703112, -37.867638727))
            ThreePointArc((-46.655703112, -37.867638727), (-45.662310142, -35.852792158), (-43.459162408, -35.413956942))
        make_face()
        with BuildLine():
            Line((-22.517053723, -8.085713426), (-6.442646109, -35.904889451))
            ThreePointArc((-6.442646109, -35.904889451), (-6.123577532, -37.506755449), (-6.845854298, -38.971711321))
            Line((-6.845854298, -38.971711321), (-8.057485269, -40.183342291))
            ThreePointArc((-8.057485269, -40.183342291), (-9.52244114, -40.905619058), (-11.124307138, -40.586550481))
            Line((-11.124307138, -40.586550481), (-38.943483164, -24.512142867))
            ThreePointArc((-38.943483164, -24.512142867), (-40.191040509, -22.643978806), (-39.468763743, -20.516832229))
            Line((-39.468763743, -20.516832229), (-26.512364361, -7.560432847))
            ThreePointArc((-26.512364361, -7.560432847), (-24.385217783, -6.838156081), (-22.517053723, -8.085713426))
        make_face()
    extrude(amount=-CUT_EXTRUDE1_DEPTH, mode=Mode.SUBTRACT)


solid = part.part
